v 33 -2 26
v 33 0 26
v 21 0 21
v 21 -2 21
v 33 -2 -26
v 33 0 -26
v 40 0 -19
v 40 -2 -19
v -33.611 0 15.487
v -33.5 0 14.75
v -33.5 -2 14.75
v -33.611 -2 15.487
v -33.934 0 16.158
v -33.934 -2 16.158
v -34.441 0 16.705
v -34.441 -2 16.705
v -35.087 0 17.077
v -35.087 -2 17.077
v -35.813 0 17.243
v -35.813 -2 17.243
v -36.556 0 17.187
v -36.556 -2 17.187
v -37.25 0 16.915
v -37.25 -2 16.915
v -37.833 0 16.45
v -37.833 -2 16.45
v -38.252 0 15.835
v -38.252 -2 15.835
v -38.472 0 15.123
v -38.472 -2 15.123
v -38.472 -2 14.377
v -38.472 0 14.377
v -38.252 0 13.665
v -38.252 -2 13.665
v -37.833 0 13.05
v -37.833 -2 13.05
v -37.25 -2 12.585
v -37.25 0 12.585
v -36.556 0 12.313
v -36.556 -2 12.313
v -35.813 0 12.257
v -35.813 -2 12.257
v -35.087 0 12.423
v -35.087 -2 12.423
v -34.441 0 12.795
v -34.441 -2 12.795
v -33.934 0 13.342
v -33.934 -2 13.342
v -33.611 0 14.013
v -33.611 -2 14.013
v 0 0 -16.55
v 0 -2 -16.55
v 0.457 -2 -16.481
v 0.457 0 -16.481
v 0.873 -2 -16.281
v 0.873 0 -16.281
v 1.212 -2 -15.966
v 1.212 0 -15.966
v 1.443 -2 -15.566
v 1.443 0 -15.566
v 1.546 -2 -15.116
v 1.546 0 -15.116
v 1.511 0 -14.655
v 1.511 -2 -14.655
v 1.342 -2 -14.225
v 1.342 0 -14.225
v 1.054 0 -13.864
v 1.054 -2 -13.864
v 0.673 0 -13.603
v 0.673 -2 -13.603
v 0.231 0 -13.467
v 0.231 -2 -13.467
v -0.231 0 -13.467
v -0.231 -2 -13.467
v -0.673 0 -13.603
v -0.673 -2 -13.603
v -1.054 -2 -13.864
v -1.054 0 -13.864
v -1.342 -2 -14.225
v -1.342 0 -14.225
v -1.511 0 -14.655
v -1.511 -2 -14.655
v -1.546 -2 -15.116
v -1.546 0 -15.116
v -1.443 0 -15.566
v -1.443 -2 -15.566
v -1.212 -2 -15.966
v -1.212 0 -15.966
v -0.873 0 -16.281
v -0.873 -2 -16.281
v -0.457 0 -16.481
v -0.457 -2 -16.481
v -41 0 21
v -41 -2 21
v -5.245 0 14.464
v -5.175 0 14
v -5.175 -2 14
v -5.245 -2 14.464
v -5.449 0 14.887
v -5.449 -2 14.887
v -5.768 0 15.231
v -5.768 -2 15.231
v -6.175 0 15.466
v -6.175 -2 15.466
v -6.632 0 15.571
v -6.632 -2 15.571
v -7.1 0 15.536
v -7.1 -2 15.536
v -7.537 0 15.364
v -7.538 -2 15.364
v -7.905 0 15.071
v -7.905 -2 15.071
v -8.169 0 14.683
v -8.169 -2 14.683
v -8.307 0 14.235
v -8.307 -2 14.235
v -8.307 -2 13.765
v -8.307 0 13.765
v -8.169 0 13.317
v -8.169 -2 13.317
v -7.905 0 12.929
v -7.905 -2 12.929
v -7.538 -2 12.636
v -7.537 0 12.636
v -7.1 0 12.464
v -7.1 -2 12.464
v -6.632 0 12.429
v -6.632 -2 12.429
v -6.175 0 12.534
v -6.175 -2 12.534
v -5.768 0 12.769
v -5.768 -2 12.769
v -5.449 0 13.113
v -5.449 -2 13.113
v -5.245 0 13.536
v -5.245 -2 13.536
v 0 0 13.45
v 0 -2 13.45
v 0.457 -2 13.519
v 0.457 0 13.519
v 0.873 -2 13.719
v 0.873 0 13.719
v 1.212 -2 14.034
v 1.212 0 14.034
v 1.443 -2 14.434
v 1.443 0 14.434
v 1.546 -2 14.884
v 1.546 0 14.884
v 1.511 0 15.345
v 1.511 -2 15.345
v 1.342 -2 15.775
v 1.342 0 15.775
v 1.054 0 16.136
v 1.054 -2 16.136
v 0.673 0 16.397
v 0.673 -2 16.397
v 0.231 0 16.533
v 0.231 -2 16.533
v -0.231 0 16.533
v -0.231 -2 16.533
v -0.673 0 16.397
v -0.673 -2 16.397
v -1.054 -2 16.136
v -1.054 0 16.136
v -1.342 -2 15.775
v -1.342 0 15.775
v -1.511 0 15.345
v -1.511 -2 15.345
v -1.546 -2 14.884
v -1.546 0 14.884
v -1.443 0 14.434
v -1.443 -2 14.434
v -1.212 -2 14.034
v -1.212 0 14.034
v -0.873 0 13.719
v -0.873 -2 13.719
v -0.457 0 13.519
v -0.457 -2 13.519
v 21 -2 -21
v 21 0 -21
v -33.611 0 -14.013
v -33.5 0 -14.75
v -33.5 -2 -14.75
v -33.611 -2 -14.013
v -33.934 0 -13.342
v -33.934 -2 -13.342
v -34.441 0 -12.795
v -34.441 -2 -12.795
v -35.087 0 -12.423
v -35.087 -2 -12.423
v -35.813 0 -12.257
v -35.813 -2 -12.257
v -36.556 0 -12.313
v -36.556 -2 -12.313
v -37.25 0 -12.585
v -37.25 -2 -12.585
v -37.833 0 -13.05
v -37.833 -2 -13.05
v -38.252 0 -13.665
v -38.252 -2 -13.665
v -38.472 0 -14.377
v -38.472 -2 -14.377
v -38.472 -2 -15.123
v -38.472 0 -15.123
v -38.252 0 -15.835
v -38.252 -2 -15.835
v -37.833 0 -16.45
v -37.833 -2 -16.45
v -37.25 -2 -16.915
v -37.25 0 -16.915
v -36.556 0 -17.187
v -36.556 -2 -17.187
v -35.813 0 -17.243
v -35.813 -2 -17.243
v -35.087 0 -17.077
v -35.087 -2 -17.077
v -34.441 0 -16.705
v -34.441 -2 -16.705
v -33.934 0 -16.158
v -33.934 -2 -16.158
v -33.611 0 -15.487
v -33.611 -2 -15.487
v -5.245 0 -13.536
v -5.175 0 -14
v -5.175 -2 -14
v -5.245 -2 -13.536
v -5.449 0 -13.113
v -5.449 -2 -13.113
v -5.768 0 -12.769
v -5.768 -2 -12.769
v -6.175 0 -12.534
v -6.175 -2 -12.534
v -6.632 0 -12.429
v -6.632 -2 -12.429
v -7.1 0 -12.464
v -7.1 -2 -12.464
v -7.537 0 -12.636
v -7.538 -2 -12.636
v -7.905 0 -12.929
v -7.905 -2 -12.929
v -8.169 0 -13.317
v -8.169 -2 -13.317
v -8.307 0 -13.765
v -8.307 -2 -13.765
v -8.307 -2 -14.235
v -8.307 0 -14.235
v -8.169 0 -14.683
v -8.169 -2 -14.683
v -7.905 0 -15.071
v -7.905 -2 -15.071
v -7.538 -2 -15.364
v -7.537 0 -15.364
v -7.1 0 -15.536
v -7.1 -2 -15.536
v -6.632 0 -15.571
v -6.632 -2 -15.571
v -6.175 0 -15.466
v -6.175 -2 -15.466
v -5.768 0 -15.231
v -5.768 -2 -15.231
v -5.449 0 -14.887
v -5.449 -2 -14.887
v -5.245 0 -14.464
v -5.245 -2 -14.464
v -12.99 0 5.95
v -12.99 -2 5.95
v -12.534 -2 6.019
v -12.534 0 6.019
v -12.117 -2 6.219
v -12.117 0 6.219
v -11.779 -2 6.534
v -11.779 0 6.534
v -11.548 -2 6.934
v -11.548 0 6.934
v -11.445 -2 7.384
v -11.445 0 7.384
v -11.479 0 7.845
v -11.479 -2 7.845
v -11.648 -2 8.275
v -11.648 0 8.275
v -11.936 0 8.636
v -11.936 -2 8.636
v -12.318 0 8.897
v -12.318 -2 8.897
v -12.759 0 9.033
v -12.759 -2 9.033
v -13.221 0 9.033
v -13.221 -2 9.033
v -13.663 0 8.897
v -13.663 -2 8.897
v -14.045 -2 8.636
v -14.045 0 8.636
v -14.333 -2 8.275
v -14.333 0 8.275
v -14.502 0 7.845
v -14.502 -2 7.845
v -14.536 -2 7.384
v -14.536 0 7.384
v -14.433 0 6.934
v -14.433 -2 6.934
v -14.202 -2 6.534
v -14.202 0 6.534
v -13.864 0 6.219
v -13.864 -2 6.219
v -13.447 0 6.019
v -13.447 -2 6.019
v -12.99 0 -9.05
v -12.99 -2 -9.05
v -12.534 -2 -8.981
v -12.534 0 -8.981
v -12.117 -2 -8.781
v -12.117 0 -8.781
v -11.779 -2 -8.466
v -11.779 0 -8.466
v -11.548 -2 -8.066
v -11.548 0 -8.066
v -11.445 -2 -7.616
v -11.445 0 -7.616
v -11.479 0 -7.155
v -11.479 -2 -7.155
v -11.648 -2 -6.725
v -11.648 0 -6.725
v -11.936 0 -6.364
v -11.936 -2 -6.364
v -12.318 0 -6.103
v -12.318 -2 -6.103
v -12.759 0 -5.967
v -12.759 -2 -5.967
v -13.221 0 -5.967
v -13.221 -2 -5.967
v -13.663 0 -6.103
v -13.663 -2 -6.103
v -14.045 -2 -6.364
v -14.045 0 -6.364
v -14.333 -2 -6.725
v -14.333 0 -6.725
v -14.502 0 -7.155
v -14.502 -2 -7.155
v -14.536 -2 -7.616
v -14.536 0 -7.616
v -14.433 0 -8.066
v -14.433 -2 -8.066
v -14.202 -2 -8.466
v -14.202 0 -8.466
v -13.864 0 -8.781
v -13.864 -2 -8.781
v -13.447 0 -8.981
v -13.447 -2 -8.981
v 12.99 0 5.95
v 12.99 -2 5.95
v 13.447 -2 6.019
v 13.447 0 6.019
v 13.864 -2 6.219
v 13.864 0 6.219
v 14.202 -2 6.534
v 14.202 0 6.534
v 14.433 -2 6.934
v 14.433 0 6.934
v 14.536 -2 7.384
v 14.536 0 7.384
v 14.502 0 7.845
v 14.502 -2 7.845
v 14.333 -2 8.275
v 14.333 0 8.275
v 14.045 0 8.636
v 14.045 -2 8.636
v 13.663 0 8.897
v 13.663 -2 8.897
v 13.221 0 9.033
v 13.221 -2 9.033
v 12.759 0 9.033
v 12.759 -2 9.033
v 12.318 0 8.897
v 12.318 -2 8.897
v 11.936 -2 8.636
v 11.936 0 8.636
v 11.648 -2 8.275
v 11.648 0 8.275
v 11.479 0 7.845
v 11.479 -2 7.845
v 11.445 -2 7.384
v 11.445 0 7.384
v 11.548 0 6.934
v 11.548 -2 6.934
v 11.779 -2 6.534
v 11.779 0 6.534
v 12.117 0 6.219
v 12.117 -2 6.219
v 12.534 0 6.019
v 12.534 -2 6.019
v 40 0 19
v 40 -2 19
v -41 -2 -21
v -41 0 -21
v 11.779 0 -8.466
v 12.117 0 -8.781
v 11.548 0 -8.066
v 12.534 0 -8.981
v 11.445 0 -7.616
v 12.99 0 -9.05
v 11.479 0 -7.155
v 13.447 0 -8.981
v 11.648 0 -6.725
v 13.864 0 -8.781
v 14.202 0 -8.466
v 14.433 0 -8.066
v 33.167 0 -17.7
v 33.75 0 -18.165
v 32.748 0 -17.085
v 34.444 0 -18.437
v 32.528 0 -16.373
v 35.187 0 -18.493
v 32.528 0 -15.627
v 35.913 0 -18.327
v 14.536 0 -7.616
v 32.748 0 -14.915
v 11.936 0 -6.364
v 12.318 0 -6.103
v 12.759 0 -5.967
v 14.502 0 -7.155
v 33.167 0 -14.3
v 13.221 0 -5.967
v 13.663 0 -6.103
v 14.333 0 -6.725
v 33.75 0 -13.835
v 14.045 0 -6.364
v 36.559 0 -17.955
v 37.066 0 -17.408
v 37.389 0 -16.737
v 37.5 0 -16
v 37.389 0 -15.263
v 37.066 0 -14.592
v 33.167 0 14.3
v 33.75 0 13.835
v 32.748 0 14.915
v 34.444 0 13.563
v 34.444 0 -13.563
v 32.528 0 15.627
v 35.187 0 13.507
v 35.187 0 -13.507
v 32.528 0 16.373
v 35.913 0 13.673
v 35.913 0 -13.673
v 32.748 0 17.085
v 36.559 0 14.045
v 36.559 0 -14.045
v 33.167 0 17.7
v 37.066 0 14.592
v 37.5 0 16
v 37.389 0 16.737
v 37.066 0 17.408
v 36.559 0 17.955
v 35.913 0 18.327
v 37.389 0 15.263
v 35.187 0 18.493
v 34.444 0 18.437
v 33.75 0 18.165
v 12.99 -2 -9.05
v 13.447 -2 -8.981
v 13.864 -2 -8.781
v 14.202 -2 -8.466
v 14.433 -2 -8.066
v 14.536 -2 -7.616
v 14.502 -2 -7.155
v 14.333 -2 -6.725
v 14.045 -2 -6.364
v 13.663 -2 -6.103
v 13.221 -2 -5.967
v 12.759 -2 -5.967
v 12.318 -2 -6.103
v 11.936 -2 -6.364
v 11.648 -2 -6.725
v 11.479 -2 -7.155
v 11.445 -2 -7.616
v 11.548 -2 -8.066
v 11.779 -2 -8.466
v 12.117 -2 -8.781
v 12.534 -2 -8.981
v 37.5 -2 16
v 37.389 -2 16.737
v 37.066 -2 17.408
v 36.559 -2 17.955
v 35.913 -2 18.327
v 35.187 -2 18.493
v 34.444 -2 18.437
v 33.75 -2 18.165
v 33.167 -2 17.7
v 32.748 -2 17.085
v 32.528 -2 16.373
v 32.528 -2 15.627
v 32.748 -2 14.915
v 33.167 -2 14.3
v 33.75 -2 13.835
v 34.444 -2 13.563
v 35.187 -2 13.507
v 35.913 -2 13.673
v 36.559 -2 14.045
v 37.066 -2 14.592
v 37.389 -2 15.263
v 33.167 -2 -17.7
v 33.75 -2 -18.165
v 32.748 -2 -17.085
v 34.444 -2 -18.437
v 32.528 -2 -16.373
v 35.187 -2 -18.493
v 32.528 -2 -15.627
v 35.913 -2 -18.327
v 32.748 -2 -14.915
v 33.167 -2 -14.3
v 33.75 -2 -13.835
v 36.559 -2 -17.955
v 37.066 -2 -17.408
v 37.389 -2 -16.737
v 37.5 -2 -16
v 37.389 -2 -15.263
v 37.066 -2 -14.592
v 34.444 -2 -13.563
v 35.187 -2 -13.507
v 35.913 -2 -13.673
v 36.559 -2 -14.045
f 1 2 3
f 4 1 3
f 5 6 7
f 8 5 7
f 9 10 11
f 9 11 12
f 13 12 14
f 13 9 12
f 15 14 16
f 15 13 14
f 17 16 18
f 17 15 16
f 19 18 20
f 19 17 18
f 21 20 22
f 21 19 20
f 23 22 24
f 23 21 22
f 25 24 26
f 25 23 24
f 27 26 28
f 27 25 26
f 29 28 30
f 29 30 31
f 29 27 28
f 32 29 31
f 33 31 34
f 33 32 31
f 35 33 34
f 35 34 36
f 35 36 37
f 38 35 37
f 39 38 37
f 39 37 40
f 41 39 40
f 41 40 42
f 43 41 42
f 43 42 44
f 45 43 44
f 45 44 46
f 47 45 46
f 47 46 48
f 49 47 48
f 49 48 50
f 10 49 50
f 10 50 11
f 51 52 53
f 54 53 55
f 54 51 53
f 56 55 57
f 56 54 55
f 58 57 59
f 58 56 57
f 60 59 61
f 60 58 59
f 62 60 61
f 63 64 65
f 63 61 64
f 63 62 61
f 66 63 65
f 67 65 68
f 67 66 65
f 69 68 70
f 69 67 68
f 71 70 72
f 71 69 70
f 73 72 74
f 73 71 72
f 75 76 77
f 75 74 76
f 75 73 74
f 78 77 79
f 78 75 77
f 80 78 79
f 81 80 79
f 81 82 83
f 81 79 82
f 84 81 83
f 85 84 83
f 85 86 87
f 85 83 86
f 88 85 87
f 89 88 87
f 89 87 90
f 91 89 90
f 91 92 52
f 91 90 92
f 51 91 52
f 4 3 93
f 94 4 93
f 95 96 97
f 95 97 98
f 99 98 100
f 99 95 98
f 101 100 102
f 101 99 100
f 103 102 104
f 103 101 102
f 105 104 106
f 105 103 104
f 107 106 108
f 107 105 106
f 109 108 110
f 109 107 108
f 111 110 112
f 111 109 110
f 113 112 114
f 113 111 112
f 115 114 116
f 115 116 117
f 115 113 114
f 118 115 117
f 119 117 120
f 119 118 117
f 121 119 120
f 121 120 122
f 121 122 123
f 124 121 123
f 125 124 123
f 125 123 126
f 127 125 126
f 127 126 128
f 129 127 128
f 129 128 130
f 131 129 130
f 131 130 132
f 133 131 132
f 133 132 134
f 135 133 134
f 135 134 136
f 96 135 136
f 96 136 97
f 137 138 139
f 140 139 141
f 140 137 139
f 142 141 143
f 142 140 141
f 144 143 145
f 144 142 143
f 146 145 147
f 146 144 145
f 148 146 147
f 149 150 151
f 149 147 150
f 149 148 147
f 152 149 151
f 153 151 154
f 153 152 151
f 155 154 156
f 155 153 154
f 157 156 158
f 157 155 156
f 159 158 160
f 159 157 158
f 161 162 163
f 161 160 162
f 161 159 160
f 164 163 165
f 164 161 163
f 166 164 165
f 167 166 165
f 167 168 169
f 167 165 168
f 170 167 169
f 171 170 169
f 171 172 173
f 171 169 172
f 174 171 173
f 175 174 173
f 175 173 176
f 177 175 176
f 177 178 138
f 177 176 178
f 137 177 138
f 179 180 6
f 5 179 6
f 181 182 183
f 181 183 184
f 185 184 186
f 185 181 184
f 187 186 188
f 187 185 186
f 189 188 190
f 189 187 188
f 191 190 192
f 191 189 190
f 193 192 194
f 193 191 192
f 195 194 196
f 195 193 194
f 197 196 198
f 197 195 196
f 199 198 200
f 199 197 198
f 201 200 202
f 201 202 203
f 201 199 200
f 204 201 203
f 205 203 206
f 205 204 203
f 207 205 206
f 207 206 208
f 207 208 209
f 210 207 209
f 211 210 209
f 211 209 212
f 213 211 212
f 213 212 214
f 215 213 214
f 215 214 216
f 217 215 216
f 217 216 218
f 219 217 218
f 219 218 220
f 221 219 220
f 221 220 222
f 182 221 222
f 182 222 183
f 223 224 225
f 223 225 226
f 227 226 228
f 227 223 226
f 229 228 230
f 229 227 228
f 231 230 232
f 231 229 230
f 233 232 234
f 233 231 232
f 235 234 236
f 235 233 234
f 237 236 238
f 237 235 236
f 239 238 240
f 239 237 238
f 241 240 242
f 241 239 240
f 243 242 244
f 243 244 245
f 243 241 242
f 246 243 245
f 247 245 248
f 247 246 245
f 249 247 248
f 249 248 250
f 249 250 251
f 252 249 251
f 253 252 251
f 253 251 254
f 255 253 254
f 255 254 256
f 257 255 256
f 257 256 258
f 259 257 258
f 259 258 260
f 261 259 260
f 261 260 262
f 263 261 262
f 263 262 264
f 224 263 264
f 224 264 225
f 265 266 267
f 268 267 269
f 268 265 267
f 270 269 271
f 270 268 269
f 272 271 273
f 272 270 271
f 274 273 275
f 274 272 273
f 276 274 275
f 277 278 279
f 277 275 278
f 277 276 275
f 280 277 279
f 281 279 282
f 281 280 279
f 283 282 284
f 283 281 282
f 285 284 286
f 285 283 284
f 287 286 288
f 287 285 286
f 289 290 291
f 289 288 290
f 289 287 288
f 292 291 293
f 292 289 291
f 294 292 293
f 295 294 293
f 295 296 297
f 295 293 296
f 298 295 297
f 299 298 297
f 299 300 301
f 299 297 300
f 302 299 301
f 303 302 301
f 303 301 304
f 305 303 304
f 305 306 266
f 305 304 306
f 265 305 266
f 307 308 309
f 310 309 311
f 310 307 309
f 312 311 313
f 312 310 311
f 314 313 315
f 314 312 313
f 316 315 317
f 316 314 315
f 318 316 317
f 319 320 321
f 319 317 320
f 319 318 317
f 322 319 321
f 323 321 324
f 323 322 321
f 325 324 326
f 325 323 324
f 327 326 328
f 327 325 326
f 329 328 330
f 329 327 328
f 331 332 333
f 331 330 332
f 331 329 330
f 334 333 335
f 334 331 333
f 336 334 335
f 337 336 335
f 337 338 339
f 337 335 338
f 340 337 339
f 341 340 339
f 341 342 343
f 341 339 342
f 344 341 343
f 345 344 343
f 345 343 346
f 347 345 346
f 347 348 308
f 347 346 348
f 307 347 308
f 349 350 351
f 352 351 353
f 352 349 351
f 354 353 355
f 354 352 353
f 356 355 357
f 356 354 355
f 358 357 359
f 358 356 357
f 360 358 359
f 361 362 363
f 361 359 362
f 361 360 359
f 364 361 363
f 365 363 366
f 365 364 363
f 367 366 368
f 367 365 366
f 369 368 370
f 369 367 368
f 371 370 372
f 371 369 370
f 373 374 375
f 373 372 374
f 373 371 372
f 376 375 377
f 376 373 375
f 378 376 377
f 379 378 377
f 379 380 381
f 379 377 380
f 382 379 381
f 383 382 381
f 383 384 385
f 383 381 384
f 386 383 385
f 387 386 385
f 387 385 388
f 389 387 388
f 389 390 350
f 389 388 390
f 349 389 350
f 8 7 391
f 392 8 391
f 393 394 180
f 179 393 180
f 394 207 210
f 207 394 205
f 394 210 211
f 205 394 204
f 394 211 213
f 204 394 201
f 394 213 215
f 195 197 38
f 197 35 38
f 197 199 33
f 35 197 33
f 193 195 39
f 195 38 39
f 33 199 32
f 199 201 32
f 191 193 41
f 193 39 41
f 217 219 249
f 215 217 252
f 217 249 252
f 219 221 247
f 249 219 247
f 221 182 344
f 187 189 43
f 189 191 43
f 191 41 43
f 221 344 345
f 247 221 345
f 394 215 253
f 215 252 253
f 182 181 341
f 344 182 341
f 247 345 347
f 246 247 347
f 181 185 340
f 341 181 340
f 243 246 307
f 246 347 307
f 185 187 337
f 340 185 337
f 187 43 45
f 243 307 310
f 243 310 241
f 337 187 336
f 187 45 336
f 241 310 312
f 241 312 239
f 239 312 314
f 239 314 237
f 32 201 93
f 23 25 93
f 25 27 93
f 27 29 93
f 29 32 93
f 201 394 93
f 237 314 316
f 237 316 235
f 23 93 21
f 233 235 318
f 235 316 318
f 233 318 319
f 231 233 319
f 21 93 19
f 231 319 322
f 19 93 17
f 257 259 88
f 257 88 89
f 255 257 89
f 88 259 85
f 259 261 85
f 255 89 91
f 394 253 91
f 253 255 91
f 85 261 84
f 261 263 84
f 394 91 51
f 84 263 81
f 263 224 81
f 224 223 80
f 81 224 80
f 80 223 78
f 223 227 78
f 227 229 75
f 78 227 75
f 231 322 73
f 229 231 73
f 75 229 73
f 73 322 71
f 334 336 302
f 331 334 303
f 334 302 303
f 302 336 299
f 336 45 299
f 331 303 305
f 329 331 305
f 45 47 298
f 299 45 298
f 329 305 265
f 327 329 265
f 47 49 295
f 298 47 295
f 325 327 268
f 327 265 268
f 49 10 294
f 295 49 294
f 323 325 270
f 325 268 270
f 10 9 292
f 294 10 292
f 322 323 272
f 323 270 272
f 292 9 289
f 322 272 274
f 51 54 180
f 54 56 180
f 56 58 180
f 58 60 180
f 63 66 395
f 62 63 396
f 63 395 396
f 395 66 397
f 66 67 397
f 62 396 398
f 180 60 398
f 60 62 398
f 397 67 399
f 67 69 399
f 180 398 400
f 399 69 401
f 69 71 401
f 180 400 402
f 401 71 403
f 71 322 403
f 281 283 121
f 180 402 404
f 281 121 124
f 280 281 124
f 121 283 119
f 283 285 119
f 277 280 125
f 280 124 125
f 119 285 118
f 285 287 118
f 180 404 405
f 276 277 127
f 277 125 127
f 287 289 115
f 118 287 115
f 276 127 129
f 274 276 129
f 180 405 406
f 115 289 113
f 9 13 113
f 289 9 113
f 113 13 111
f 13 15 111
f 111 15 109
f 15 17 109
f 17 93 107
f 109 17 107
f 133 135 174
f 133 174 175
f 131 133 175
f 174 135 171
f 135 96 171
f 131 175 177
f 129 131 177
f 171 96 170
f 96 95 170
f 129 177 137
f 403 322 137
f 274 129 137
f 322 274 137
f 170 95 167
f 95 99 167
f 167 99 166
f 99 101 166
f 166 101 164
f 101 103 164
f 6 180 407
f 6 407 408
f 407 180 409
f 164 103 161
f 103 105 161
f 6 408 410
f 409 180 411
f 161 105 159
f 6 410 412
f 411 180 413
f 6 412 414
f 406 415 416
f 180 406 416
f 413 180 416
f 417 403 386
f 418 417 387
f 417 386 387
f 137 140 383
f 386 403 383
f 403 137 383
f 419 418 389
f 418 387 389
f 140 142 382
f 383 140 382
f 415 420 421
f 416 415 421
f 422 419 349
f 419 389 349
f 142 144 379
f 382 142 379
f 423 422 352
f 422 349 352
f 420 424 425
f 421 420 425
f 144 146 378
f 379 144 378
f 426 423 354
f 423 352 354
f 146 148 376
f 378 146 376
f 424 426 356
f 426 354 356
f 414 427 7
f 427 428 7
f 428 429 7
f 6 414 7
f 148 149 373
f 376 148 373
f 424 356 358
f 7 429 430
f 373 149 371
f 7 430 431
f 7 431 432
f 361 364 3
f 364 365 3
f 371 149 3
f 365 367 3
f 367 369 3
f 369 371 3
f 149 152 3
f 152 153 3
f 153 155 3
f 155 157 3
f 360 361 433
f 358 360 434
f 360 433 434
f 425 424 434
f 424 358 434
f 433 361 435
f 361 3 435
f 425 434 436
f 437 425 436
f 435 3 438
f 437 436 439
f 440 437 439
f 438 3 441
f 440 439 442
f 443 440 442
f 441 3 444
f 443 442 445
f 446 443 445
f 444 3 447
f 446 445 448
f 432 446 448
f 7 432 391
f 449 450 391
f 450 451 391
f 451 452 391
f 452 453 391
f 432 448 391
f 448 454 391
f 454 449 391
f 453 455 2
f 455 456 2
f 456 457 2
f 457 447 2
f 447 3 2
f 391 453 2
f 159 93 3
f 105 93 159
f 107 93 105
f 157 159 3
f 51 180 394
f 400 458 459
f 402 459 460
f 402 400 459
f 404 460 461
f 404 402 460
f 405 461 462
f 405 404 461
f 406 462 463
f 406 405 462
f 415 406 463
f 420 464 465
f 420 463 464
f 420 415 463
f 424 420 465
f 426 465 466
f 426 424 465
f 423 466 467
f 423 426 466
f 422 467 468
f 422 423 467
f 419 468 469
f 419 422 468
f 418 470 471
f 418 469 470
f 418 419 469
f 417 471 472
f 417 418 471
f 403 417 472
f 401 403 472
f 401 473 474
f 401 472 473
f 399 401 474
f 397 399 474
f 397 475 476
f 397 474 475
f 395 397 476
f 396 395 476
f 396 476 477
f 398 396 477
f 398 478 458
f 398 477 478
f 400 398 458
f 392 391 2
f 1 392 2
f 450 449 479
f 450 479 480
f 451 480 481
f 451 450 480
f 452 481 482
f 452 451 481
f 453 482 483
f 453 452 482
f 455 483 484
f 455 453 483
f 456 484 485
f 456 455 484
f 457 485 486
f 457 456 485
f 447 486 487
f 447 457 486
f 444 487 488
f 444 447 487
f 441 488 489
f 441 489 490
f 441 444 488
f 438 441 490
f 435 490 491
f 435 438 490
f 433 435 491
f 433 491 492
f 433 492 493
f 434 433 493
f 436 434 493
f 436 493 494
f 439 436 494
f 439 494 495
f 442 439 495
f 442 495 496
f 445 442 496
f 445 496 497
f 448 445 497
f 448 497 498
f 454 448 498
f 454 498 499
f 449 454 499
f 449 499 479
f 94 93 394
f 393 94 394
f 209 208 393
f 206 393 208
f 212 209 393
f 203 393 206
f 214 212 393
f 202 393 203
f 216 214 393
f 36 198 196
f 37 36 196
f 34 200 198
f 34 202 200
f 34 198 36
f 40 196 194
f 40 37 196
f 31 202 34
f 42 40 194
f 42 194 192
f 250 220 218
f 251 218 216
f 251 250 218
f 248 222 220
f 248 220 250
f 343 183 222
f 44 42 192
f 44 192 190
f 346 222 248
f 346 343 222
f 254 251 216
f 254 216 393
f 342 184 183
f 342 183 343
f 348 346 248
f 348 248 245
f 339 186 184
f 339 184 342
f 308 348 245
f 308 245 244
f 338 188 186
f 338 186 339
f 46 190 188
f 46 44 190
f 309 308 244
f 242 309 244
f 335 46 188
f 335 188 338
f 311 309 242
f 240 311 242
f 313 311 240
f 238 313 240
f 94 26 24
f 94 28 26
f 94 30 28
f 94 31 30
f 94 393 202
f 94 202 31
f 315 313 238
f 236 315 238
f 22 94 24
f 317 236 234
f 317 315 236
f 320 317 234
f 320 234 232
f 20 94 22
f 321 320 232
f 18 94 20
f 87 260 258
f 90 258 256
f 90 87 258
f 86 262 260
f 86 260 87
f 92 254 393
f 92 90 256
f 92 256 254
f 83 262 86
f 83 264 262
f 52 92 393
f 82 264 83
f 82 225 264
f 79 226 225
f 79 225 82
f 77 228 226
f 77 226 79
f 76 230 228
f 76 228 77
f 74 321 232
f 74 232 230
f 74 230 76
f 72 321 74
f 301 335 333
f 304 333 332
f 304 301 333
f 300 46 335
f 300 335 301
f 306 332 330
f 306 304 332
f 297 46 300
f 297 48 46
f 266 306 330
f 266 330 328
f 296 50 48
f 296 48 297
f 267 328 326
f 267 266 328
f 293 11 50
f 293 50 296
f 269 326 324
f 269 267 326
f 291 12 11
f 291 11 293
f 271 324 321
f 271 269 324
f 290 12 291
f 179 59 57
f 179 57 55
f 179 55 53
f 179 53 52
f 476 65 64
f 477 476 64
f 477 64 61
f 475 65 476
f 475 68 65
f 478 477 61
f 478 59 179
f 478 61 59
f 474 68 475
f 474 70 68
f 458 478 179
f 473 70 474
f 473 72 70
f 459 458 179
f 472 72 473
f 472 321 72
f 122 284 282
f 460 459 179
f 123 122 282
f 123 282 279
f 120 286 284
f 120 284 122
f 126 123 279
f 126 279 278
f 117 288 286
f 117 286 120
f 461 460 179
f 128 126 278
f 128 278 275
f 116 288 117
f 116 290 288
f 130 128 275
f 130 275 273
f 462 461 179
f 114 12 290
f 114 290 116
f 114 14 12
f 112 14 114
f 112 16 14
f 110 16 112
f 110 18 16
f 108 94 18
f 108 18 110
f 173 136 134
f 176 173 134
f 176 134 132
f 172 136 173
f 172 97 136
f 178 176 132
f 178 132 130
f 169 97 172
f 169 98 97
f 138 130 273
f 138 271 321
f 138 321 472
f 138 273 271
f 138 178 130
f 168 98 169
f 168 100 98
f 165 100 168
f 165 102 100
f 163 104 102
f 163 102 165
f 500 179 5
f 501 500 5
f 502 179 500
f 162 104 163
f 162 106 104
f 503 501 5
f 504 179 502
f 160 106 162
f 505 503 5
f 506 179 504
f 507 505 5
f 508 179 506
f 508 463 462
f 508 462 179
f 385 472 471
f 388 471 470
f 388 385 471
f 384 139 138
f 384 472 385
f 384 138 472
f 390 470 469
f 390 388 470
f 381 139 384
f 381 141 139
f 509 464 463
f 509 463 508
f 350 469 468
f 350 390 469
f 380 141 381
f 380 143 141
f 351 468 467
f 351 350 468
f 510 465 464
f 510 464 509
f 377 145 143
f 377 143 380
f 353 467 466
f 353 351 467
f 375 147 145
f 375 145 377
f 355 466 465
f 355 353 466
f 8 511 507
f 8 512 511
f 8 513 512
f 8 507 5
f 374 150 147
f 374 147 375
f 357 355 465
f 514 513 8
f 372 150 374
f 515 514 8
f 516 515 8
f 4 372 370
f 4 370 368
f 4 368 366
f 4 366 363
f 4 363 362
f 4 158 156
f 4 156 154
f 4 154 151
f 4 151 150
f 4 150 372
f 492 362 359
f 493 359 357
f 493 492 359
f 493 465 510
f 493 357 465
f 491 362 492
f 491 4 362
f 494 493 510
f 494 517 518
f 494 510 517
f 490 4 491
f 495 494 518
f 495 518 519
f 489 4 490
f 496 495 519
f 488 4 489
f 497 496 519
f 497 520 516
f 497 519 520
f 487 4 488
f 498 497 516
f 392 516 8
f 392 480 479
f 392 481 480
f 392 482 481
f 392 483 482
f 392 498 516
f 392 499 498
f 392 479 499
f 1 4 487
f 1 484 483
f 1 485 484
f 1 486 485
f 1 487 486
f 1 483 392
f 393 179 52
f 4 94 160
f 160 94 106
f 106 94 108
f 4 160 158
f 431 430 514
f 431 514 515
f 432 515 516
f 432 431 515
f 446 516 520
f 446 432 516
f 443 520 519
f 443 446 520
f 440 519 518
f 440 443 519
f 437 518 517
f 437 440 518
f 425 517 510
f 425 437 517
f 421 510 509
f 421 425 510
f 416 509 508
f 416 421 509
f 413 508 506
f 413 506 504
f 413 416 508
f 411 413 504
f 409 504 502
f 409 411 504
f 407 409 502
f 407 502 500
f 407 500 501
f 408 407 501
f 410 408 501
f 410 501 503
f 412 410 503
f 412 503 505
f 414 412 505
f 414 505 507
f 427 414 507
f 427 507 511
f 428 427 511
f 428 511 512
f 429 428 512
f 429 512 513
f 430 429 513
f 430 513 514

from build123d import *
from build123d.topology import SkipClean

# Parameters (mm, degrees)
SKETCH_1_R          = 25
SKETCH_1_W          = 81
SKETCH_1_H          = 42
SKETCH_1_R_2        = 2.5
EXTRUDE_1_DEPTH     = 5
SKETCH_3_W          = 8.1
SKETCH_3_H          = 6.6
SKETCH_3_R          = 1.575
CUT_EXTRUDE_1_DEPTH = 2
SKETCH_3_2_R        = 1.575
CUT_EXTRUDE_2_DEPTH = 49.280430818
SKETCH_4_W          = 8
SKETCH_4_H          = 2.9
EXTRUDE_2_DEPTH     = 42
SKETCH_1_3_R        = 2.5
CUT_EXTRUDE_3_DEPTH = 42
EXTRUDE_START       = 21
SKETCH_5_W          = 11
SKETCH_5_H          = 2.9
EXTRUDE_3_DEPTH     = 5
SKETCH_5_W_2        = 12
EXTRUDE_3_2_DEPTH   = 5
CUT_EXTRUDE_4_REACH = 87.138
CHAMFER_1_SIZE      = 2
EXTRUDE_4_DEPTH     = 15
EXTRUDE_4_2_DEPTH   = 15
EXTRUDE_START_2     = -15
EXTRUDE_5_DEPTH     = 7.9
EXTRUDE_6_DEPTH     = 15
EXTRUDE_7_DEPTH     = 7.9
FILLET_1_R          = 5
SKETCH_12_R         = 2.5
SKETCH_12_R_2       = 1.575
EXTRUDE_8_DEPTH     = 2
SKETCH_13_W         = 180
SKETCH_13_H         = 120
CUT_EXTRUDE_5_DEPTH = 51.813384064
SKETCH_14_R         = 1.55
CUT_EXTRUDE_7_DEPTH = 10


# Read off the part's stored shape, not the designer's step: 凸台-拉伸7
with BuildPart() as part:
    # 草图1 → 凸台-拉伸1 (new body)
    # profile 1 of 2: a face of its own
    with BuildSketch(Plane(origin=(0, 0, 0), x_dir=(1, 0, 0), z_dir=(0, 1, 0))):
        Circle(SKETCH_1_R)
    # profile 2 of 2: a face of its own
    with BuildSketch(Plane(origin=(0, 0, 0), x_dir=(1, 0, 0), z_dir=(0, 1, 0))):
        with Locations((-0.5, 0)):
            Rectangle(SKETCH_1_W, SKETCH_1_H)
        with Locations(Location((35, 16, 0), (0, 0, 270))):
            Circle(SKETCH_1_R_2, mode=Mode.SUBTRACT)
        with Locations(Location((35, -16, 0), (0, 0, 270))):
            Circle(SKETCH_1_R_2, mode=Mode.SUBTRACT)
        with Locations(Location((-36, 14.75, 0), (0, 0, 270))):
            Circle(SKETCH_1_R_2, mode=Mode.SUBTRACT)
        with Locations(Location((-36, -14.75, 0), (0, 0, 270))):
            Circle(SKETCH_1_R_2, mode=Mode.SUBTRACT)
    extrude(amount=EXTRUDE_1_DEPTH)

    # 草图3 → 切除-拉伸1 (cut)
    # profile 1 of 2: a face of its own
    with BuildSketch(Plane(origin=(0, 5, 0), x_dir=(1, 0, 0), z_dir=(0, 1, 0))):
        with Locations((-6.75, -14)):
            Rectangle(SKETCH_3_W, SKETCH_3_H)
        with Locations(Location((-6.75, -14, 0), (0, 0, 90))):
            Circle(SKETCH_3_R, mode=Mode.SUBTRACT)
    # profile 2 of 2: a face of its own
    with BuildSketch(Plane(origin=(0, 5, 0), x_dir=(1, 0, 0), z_dir=(0, 1, 0))):
        with Locations((-6.75, 14)):
            Rectangle(SKETCH_3_W, SKETCH_3_H)
        with Locations(Location((-6.75, 14, 0), (0, 0, 270))):
            Circle(SKETCH_3_R, mode=Mode.SUBTRACT)
    extrude(amount=-CUT_EXTRUDE_1_DEPTH, mode=Mode.SUBTRACT)

    # 草图3<2> → 切除-拉伸2 (cut, through all)
    with BuildSketch(Plane(origin=(0, 5, 0), x_dir=(1, 0, 0), z_dir=(0, 1, 0))):
        with Locations(Location((-6.75, 14, 0), (0, 0, 270))):
            Circle(SKETCH_3_2_R)
        with Locations(Location((-6.75, -14, 0), (0, 0, 270))):
            Circle(SKETCH_3_2_R)
    extrude(amount=-CUT_EXTRUDE_2_DEPTH, mode=Mode.SUBTRACT)

    # 草图4 → 凸台-拉伸2 (add)
    with BuildSketch(Plane.XY.offset(21)):
        with Locations((36, 6.45)):
            Rectangle(SKETCH_4_W, SKETCH_4_H)
        with Locations((-37, 6.45)):
            Rectangle(SKETCH_4_W, SKETCH_4_H)
    extrude(amount=-EXTRUDE_2_DEPTH)

    # 草图1<3> → 切除-拉伸3 (cut)
    with BuildSketch(Plane(origin=(0, 0, 0), x_dir=(1, 0, 0), z_dir=(0, 1, 0))):
        with Locations(Location((35, 16, 0), (0, 0, 270))):
            Circle(SKETCH_1_3_R)
        with Locations(Location((35, -16, 0), (0, 0, 270))):
            Circle(SKETCH_1_3_R)
        with Locations(Location((-36, 14.75, 0), (0, 0, 180))):
            Circle(SKETCH_1_3_R)
        with Locations(Location((-36, -14.75, 0), (0, 0, 180))):
            Circle(SKETCH_1_3_R)
    extrude(amount=CUT_EXTRUDE_3_DEPTH, mode=Mode.SUBTRACT)


with BuildPart() as body_2:
    # 草图5 → 凸台-拉伸3 (new body)
    with BuildSketch(Plane.XY.offset(EXTRUDE_START)):
        with Locations((26.5, 6.45)):
            Rectangle(SKETCH_5_W, SKETCH_5_H)
    extrude_3 = extrude(amount=-EXTRUDE_3_DEPTH)


with BuildPart() as body_3:
    # 草图5 → Extrude 3 2 (new body)
    with BuildSketch(Plane.XY.offset(EXTRUDE_START)):
        with Locations((-27, 6.45)):
            Rectangle(SKETCH_5_W_2, SKETCH_5_H)
    extrude_3_2 = extrude(amount=-EXTRUDE_3_2_DEPTH)



with BuildPart() as part_1:
    add(part.part)

    # 镜向2: 凸台-拉伸3, Extrude 3 2 across plane
    add(extrude_3.mirror(Plane(origin=(0, 0, 0), x_dir=(1, 0, 0), z_dir=(0, 0, -1))))
    add(extrude_3_2.mirror(Plane(origin=(0, 0, 0), x_dir=(1, 0, 0), z_dir=(0, 0, -1))))

    # 切除-拉伸4: up to this face of the body (flat: up to its plane)
    cut_extrude_4_end = Plane(part_1.part.faces().sort_by_distance((32, 6.45, 2.5))[0])
    # 草图6 → 切除-拉伸4 (cut, up to the picked face)
    with BuildSketch(Plane.ZY.offset(41), mode=Mode.PRIVATE) as cut_extrude_4_sk1:
        with BuildLine():
            Line((11.041960784, 8.971428571), (-11.041960784, 8.971428571))
            ThreePointArc((-11.041960784, 8.971428571), (-8.690257734, 7.239234925), (-6.072727273, 5.943265655))
            ThreePointArc((-6.072727273, 5.943265655), (0, 4.8), (6.072727273, 5.943265655))
            ThreePointArc((6.072727273, 5.943265655), (8.690257734, 7.239234925), (11.041960784, 8.971428571))
        make_face()
    cut_extrude_4_tool1 = split(extrude(cut_extrude_4_sk1.sketch, amount=-CUT_EXTRUDE_4_REACH, mode=Mode.PRIVATE), bisect_by=cut_extrude_4_end, keep=Keep.BOTH, mode=Mode.PRIVATE)
    add(cut_extrude_4_tool1.solids().sort_by(Axis((-41, 7.283597, 0), (1, 0, 0)))[0], mode=Mode.SUBTRACT)

    # 倒角1
    chamfer_1_edges = [part_1.edges().sort_by_distance(p)[0] for p in [
        (-41, 3.95, 21),
        (-41, 3.95, -21),
        (40, 3.95, -21),
        (40, 3.95, 21),
    ]]
    chamfer(chamfer_1_edges, length=CHAMFER_1_SIZE)



with BuildPart() as body_4:
    # 草图9 → 凸台-拉伸4 (new body)
    with BuildSketch(Plane.XZ):
        with BuildLine():
            Line((33, 26), (23.72846392, 26))
            ThreePointArc((23.72846392, 26), (24.88485791, 24.895458357), (25.989891949, 23.739534884))
            ThreePointArc((25.989891949, 23.739534884), (27.687521221, 22.340851231), (29.708138181, 21.471732017))
            ThreePointArc((29.708138181, 21.471732017), (30.719571772, 21.268231436), (31.749015733, 21.2))
            Line((31.749015733, 21.2), (37.8, 21.2))
            Line((37.8, 21.2), (33, 26))
        make_face()
    extrude(amount=-EXTRUDE_4_DEPTH)


with BuildPart() as body_5:
    # 草图9 → Extrude 4 2 (new body)
    with BuildSketch(Plane.XZ):
        with BuildLine():
            Line((33, -26), (37.8, -21.2))
            Line((37.8, -21.2), (31.749015733, -21.2))
            ThreePointArc((31.749015733, -21.2), (30.719571772, -21.268231436), (29.708138181, -21.471732017))
            ThreePointArc((29.708138181, -21.471732017), (27.687521221, -22.340851231), (25.989891949, -23.739534884))
            ThreePointArc((25.989891949, -23.739534884), (24.88485791, -24.895458357), (23.72846392, -26))
            Line((23.72846392, -26), (33, -26))
        make_face()
    extrude(amount=-EXTRUDE_4_2_DEPTH)


with BuildPart() as part_2:
    add(part_1.part)

    add(body_4.part)  # 凸台-拉伸5 merges body 4
    # 草图10 → 凸台-拉伸5 (add)
    with BuildSketch(Plane(origin=(0, 15, 0), x_dir=(1, 0, 0), z_dir=(0, 1, 0)).offset(EXTRUDE_START_2)):
        with BuildLine():
            Line((21, -21), (23.72846392, -26))
            ThreePointArc((23.72846392, -26), (24.88485791, -24.895458357), (25.989891949, -23.739534884))
            ThreePointArc((25.989891949, -23.739534884), (28.601924052, -21.863066908), (31.749015733, -21.2))
            Line((31.749015733, -21.2), (37.8, -21.2))
            Line((37.8, -21.2), (38, -21))
            Line((38, -21), (32, -21))
            Line((32, -21), (21, -21))
        make_face()
    extrude_5 = extrude(amount=EXTRUDE_5_DEPTH)


with BuildPart() as body_3_1:
    add(body_3.part)

    add(part_2.part)  # 凸台-拉伸6 merges part
    # 草图11 → 凸台-拉伸6 (add)
    with BuildSketch(Plane.XZ.offset(EXTRUDE_START_2)):
        with BuildLine():
            Line((-41, 23), (-41, 20.45))
            Line((-41, 20.45), (-40.520827978, 20.45))
            ThreePointArc((-40.520827978, 20.45), (-40.024975712, 20.455165886), (-39.5293387, 20.4706613))
            Line((-39.5293387, 20.4706613), (-39, 21))
            Line((-39, 21), (-35.43383476, 21))
            ThreePointArc((-35.43383476, 21), (-31.171725667, 22.363148102), (-27.240108871, 24.5))
            Line((-27.240108871, 24.5), (-41, 24.5))
            Line((-41, 24.5), (-41, 23))
        make_face()
        with BuildLine():
            Line((-39, 21), (-39.5293387, 20.4706613))
            ThreePointArc((-39.5293387, 20.4706613), (-39.301113021, 20.481274846), (-39.072999743, 20.494078772))
            ThreePointArc((-39.072999743, 20.494078772), (-38.358018151, 20.54847571), (-37.644999743, 20.624386527))
            ThreePointArc((-37.644999743, 20.624386527), (-36.534990206, 20.786132091), (-35.43383476, 21))
            Line((-35.43383476, 21), (-39, 21))
        make_face()
    extrude_6 = extrude(amount=EXTRUDE_6_DEPTH)

    # 凸台-拉伸7 outline → 凸台-拉伸7 (add)
    with BuildSketch(Plane(origin=(0, 0, 0), x_dir=(1, 0, 0), z_dir=(0, 1, 0))):
        with BuildLine():
            Line((-39.5293387, -20.4706613), (-41, -19))
            Line((-41, -19), (-41, -20.45))
            Line((-41, -20.45), (-40.520827978, -20.45))
            ThreePointArc((-40.520827978, -20.45), (-40.024975712, -20.455165886), (-39.5293387, -20.4706613))
        make_face()
        with BuildLine():
            Line((-21, -21), (-35.43383476, -21))
            ThreePointArc((-35.43383476, -21), (-31.171725667, -22.363148102), (-27.240108871, -24.5))
            Line((-27.240108871, -24.5), (-21, -21))
        make_face()
    extrude_7 = extrude(amount=EXTRUDE_7_DEPTH)

    # 镜向3: 凸台-拉伸5, 凸台-拉伸6, 凸台-拉伸7 across plane
    add(extrude_5.mirror(Plane(origin=(0, 0, 0), x_dir=(1, 0, 0), z_dir=(0, 0, -1))))
    add(extrude_6.mirror(Plane(origin=(0, 0, 0), x_dir=(1, 0, 0), z_dir=(0, 0, -1))))
    add(extrude_7.mirror(Plane(origin=(0, 0, 0), x_dir=(1, 0, 0), z_dir=(0, 0, -1))))


with BuildPart() as body_2_1:
    add(body_2.part)

    # Combine 1: union body 3, body 5
    add(body_3_1.part)
    add(body_5.part)

    # 圆角1
    fillet_1_edges = [body_2_1.edges().sort_by_distance(p)[0] for p in [
        (32, 6.45, 16),
        (-33, 6.45, 16),
        (-33, 6.45, -16),
        (32, 6.45, -16),
    ]]
    fillet(fillet_1_edges, radius=FILLET_1_R)

    # 草图12 → 凸台-拉伸8 (add)
    with SkipClean():  # the faces are left unmerged after this step: merging them gives an invalid solid
        with BuildSketch(Plane.XZ):
            Polygon((13.564659966, 21), (-13.564659966, 21), (-21, 21), (-41, 21), (-41, -21), (-21, -21), (-13.564659966, -21), (13.564659966, -21), (21, -21), (33, -26), (40, -19), (40, 19), (33, 26), (21, 21), align=None)
            with Locations((-36, -14.75)):
                Circle(SKETCH_12_R, mode=Mode.SUBTRACT)
            with Locations((-6.75, -14)):
                Circle(SKETCH_12_R_2, mode=Mode.SUBTRACT)
            with Locations((35, -16)):
                Circle(SKETCH_12_R, mode=Mode.SUBTRACT)
            with Locations((-36, 14.75)):
                Circle(SKETCH_12_R, mode=Mode.SUBTRACT)
            with Locations((-6.75, 14)):
                Circle(SKETCH_12_R_2, mode=Mode.SUBTRACT)
            with Locations((35, 16)):
                Circle(SKETCH_12_R, mode=Mode.SUBTRACT)
        extrude(amount=EXTRUDE_8_DEPTH)

    # 草图13 → 切除-拉伸5 (cut, through all)
    with BuildSketch(Plane.XZ):
        with Locations((-41, 24.5)):
            Rectangle(SKETCH_13_W, SKETCH_13_H)
    extrude(amount=-CUT_EXTRUDE_5_DEPTH, mode=Mode.SUBTRACT)

    # 草图14 → 切除-拉伸7 (cut)
    with BuildSketch(Plane.XZ):
        with Locations(Location((12.990381057, 7.5, 0), (0, 0, 270))):
            Circle(SKETCH_14_R)
        with Locations(Location((12.990381057, -7.5, 0), (0, 0, 270))):
            Circle(SKETCH_14_R)
        with Locations(Location((0, -15, 0), (0, 0, 270))):
            Circle(SKETCH_14_R)
        with Locations(Location((-12.990381057, -7.5, 0), (0, 0, 270))):
            Circle(SKETCH_14_R)
        with Locations(Location((-12.990381057, 7.5, 0), (0, 0, 270))):
            Circle(SKETCH_14_R)
        with Locations(Location((0, 15, 0), (0, 0, 270))):
            Circle(SKETCH_14_R)
    extrude(amount=CUT_EXTRUDE_7_DEPTH, mode=Mode.SUBTRACT)


solid = body_2_1.part
